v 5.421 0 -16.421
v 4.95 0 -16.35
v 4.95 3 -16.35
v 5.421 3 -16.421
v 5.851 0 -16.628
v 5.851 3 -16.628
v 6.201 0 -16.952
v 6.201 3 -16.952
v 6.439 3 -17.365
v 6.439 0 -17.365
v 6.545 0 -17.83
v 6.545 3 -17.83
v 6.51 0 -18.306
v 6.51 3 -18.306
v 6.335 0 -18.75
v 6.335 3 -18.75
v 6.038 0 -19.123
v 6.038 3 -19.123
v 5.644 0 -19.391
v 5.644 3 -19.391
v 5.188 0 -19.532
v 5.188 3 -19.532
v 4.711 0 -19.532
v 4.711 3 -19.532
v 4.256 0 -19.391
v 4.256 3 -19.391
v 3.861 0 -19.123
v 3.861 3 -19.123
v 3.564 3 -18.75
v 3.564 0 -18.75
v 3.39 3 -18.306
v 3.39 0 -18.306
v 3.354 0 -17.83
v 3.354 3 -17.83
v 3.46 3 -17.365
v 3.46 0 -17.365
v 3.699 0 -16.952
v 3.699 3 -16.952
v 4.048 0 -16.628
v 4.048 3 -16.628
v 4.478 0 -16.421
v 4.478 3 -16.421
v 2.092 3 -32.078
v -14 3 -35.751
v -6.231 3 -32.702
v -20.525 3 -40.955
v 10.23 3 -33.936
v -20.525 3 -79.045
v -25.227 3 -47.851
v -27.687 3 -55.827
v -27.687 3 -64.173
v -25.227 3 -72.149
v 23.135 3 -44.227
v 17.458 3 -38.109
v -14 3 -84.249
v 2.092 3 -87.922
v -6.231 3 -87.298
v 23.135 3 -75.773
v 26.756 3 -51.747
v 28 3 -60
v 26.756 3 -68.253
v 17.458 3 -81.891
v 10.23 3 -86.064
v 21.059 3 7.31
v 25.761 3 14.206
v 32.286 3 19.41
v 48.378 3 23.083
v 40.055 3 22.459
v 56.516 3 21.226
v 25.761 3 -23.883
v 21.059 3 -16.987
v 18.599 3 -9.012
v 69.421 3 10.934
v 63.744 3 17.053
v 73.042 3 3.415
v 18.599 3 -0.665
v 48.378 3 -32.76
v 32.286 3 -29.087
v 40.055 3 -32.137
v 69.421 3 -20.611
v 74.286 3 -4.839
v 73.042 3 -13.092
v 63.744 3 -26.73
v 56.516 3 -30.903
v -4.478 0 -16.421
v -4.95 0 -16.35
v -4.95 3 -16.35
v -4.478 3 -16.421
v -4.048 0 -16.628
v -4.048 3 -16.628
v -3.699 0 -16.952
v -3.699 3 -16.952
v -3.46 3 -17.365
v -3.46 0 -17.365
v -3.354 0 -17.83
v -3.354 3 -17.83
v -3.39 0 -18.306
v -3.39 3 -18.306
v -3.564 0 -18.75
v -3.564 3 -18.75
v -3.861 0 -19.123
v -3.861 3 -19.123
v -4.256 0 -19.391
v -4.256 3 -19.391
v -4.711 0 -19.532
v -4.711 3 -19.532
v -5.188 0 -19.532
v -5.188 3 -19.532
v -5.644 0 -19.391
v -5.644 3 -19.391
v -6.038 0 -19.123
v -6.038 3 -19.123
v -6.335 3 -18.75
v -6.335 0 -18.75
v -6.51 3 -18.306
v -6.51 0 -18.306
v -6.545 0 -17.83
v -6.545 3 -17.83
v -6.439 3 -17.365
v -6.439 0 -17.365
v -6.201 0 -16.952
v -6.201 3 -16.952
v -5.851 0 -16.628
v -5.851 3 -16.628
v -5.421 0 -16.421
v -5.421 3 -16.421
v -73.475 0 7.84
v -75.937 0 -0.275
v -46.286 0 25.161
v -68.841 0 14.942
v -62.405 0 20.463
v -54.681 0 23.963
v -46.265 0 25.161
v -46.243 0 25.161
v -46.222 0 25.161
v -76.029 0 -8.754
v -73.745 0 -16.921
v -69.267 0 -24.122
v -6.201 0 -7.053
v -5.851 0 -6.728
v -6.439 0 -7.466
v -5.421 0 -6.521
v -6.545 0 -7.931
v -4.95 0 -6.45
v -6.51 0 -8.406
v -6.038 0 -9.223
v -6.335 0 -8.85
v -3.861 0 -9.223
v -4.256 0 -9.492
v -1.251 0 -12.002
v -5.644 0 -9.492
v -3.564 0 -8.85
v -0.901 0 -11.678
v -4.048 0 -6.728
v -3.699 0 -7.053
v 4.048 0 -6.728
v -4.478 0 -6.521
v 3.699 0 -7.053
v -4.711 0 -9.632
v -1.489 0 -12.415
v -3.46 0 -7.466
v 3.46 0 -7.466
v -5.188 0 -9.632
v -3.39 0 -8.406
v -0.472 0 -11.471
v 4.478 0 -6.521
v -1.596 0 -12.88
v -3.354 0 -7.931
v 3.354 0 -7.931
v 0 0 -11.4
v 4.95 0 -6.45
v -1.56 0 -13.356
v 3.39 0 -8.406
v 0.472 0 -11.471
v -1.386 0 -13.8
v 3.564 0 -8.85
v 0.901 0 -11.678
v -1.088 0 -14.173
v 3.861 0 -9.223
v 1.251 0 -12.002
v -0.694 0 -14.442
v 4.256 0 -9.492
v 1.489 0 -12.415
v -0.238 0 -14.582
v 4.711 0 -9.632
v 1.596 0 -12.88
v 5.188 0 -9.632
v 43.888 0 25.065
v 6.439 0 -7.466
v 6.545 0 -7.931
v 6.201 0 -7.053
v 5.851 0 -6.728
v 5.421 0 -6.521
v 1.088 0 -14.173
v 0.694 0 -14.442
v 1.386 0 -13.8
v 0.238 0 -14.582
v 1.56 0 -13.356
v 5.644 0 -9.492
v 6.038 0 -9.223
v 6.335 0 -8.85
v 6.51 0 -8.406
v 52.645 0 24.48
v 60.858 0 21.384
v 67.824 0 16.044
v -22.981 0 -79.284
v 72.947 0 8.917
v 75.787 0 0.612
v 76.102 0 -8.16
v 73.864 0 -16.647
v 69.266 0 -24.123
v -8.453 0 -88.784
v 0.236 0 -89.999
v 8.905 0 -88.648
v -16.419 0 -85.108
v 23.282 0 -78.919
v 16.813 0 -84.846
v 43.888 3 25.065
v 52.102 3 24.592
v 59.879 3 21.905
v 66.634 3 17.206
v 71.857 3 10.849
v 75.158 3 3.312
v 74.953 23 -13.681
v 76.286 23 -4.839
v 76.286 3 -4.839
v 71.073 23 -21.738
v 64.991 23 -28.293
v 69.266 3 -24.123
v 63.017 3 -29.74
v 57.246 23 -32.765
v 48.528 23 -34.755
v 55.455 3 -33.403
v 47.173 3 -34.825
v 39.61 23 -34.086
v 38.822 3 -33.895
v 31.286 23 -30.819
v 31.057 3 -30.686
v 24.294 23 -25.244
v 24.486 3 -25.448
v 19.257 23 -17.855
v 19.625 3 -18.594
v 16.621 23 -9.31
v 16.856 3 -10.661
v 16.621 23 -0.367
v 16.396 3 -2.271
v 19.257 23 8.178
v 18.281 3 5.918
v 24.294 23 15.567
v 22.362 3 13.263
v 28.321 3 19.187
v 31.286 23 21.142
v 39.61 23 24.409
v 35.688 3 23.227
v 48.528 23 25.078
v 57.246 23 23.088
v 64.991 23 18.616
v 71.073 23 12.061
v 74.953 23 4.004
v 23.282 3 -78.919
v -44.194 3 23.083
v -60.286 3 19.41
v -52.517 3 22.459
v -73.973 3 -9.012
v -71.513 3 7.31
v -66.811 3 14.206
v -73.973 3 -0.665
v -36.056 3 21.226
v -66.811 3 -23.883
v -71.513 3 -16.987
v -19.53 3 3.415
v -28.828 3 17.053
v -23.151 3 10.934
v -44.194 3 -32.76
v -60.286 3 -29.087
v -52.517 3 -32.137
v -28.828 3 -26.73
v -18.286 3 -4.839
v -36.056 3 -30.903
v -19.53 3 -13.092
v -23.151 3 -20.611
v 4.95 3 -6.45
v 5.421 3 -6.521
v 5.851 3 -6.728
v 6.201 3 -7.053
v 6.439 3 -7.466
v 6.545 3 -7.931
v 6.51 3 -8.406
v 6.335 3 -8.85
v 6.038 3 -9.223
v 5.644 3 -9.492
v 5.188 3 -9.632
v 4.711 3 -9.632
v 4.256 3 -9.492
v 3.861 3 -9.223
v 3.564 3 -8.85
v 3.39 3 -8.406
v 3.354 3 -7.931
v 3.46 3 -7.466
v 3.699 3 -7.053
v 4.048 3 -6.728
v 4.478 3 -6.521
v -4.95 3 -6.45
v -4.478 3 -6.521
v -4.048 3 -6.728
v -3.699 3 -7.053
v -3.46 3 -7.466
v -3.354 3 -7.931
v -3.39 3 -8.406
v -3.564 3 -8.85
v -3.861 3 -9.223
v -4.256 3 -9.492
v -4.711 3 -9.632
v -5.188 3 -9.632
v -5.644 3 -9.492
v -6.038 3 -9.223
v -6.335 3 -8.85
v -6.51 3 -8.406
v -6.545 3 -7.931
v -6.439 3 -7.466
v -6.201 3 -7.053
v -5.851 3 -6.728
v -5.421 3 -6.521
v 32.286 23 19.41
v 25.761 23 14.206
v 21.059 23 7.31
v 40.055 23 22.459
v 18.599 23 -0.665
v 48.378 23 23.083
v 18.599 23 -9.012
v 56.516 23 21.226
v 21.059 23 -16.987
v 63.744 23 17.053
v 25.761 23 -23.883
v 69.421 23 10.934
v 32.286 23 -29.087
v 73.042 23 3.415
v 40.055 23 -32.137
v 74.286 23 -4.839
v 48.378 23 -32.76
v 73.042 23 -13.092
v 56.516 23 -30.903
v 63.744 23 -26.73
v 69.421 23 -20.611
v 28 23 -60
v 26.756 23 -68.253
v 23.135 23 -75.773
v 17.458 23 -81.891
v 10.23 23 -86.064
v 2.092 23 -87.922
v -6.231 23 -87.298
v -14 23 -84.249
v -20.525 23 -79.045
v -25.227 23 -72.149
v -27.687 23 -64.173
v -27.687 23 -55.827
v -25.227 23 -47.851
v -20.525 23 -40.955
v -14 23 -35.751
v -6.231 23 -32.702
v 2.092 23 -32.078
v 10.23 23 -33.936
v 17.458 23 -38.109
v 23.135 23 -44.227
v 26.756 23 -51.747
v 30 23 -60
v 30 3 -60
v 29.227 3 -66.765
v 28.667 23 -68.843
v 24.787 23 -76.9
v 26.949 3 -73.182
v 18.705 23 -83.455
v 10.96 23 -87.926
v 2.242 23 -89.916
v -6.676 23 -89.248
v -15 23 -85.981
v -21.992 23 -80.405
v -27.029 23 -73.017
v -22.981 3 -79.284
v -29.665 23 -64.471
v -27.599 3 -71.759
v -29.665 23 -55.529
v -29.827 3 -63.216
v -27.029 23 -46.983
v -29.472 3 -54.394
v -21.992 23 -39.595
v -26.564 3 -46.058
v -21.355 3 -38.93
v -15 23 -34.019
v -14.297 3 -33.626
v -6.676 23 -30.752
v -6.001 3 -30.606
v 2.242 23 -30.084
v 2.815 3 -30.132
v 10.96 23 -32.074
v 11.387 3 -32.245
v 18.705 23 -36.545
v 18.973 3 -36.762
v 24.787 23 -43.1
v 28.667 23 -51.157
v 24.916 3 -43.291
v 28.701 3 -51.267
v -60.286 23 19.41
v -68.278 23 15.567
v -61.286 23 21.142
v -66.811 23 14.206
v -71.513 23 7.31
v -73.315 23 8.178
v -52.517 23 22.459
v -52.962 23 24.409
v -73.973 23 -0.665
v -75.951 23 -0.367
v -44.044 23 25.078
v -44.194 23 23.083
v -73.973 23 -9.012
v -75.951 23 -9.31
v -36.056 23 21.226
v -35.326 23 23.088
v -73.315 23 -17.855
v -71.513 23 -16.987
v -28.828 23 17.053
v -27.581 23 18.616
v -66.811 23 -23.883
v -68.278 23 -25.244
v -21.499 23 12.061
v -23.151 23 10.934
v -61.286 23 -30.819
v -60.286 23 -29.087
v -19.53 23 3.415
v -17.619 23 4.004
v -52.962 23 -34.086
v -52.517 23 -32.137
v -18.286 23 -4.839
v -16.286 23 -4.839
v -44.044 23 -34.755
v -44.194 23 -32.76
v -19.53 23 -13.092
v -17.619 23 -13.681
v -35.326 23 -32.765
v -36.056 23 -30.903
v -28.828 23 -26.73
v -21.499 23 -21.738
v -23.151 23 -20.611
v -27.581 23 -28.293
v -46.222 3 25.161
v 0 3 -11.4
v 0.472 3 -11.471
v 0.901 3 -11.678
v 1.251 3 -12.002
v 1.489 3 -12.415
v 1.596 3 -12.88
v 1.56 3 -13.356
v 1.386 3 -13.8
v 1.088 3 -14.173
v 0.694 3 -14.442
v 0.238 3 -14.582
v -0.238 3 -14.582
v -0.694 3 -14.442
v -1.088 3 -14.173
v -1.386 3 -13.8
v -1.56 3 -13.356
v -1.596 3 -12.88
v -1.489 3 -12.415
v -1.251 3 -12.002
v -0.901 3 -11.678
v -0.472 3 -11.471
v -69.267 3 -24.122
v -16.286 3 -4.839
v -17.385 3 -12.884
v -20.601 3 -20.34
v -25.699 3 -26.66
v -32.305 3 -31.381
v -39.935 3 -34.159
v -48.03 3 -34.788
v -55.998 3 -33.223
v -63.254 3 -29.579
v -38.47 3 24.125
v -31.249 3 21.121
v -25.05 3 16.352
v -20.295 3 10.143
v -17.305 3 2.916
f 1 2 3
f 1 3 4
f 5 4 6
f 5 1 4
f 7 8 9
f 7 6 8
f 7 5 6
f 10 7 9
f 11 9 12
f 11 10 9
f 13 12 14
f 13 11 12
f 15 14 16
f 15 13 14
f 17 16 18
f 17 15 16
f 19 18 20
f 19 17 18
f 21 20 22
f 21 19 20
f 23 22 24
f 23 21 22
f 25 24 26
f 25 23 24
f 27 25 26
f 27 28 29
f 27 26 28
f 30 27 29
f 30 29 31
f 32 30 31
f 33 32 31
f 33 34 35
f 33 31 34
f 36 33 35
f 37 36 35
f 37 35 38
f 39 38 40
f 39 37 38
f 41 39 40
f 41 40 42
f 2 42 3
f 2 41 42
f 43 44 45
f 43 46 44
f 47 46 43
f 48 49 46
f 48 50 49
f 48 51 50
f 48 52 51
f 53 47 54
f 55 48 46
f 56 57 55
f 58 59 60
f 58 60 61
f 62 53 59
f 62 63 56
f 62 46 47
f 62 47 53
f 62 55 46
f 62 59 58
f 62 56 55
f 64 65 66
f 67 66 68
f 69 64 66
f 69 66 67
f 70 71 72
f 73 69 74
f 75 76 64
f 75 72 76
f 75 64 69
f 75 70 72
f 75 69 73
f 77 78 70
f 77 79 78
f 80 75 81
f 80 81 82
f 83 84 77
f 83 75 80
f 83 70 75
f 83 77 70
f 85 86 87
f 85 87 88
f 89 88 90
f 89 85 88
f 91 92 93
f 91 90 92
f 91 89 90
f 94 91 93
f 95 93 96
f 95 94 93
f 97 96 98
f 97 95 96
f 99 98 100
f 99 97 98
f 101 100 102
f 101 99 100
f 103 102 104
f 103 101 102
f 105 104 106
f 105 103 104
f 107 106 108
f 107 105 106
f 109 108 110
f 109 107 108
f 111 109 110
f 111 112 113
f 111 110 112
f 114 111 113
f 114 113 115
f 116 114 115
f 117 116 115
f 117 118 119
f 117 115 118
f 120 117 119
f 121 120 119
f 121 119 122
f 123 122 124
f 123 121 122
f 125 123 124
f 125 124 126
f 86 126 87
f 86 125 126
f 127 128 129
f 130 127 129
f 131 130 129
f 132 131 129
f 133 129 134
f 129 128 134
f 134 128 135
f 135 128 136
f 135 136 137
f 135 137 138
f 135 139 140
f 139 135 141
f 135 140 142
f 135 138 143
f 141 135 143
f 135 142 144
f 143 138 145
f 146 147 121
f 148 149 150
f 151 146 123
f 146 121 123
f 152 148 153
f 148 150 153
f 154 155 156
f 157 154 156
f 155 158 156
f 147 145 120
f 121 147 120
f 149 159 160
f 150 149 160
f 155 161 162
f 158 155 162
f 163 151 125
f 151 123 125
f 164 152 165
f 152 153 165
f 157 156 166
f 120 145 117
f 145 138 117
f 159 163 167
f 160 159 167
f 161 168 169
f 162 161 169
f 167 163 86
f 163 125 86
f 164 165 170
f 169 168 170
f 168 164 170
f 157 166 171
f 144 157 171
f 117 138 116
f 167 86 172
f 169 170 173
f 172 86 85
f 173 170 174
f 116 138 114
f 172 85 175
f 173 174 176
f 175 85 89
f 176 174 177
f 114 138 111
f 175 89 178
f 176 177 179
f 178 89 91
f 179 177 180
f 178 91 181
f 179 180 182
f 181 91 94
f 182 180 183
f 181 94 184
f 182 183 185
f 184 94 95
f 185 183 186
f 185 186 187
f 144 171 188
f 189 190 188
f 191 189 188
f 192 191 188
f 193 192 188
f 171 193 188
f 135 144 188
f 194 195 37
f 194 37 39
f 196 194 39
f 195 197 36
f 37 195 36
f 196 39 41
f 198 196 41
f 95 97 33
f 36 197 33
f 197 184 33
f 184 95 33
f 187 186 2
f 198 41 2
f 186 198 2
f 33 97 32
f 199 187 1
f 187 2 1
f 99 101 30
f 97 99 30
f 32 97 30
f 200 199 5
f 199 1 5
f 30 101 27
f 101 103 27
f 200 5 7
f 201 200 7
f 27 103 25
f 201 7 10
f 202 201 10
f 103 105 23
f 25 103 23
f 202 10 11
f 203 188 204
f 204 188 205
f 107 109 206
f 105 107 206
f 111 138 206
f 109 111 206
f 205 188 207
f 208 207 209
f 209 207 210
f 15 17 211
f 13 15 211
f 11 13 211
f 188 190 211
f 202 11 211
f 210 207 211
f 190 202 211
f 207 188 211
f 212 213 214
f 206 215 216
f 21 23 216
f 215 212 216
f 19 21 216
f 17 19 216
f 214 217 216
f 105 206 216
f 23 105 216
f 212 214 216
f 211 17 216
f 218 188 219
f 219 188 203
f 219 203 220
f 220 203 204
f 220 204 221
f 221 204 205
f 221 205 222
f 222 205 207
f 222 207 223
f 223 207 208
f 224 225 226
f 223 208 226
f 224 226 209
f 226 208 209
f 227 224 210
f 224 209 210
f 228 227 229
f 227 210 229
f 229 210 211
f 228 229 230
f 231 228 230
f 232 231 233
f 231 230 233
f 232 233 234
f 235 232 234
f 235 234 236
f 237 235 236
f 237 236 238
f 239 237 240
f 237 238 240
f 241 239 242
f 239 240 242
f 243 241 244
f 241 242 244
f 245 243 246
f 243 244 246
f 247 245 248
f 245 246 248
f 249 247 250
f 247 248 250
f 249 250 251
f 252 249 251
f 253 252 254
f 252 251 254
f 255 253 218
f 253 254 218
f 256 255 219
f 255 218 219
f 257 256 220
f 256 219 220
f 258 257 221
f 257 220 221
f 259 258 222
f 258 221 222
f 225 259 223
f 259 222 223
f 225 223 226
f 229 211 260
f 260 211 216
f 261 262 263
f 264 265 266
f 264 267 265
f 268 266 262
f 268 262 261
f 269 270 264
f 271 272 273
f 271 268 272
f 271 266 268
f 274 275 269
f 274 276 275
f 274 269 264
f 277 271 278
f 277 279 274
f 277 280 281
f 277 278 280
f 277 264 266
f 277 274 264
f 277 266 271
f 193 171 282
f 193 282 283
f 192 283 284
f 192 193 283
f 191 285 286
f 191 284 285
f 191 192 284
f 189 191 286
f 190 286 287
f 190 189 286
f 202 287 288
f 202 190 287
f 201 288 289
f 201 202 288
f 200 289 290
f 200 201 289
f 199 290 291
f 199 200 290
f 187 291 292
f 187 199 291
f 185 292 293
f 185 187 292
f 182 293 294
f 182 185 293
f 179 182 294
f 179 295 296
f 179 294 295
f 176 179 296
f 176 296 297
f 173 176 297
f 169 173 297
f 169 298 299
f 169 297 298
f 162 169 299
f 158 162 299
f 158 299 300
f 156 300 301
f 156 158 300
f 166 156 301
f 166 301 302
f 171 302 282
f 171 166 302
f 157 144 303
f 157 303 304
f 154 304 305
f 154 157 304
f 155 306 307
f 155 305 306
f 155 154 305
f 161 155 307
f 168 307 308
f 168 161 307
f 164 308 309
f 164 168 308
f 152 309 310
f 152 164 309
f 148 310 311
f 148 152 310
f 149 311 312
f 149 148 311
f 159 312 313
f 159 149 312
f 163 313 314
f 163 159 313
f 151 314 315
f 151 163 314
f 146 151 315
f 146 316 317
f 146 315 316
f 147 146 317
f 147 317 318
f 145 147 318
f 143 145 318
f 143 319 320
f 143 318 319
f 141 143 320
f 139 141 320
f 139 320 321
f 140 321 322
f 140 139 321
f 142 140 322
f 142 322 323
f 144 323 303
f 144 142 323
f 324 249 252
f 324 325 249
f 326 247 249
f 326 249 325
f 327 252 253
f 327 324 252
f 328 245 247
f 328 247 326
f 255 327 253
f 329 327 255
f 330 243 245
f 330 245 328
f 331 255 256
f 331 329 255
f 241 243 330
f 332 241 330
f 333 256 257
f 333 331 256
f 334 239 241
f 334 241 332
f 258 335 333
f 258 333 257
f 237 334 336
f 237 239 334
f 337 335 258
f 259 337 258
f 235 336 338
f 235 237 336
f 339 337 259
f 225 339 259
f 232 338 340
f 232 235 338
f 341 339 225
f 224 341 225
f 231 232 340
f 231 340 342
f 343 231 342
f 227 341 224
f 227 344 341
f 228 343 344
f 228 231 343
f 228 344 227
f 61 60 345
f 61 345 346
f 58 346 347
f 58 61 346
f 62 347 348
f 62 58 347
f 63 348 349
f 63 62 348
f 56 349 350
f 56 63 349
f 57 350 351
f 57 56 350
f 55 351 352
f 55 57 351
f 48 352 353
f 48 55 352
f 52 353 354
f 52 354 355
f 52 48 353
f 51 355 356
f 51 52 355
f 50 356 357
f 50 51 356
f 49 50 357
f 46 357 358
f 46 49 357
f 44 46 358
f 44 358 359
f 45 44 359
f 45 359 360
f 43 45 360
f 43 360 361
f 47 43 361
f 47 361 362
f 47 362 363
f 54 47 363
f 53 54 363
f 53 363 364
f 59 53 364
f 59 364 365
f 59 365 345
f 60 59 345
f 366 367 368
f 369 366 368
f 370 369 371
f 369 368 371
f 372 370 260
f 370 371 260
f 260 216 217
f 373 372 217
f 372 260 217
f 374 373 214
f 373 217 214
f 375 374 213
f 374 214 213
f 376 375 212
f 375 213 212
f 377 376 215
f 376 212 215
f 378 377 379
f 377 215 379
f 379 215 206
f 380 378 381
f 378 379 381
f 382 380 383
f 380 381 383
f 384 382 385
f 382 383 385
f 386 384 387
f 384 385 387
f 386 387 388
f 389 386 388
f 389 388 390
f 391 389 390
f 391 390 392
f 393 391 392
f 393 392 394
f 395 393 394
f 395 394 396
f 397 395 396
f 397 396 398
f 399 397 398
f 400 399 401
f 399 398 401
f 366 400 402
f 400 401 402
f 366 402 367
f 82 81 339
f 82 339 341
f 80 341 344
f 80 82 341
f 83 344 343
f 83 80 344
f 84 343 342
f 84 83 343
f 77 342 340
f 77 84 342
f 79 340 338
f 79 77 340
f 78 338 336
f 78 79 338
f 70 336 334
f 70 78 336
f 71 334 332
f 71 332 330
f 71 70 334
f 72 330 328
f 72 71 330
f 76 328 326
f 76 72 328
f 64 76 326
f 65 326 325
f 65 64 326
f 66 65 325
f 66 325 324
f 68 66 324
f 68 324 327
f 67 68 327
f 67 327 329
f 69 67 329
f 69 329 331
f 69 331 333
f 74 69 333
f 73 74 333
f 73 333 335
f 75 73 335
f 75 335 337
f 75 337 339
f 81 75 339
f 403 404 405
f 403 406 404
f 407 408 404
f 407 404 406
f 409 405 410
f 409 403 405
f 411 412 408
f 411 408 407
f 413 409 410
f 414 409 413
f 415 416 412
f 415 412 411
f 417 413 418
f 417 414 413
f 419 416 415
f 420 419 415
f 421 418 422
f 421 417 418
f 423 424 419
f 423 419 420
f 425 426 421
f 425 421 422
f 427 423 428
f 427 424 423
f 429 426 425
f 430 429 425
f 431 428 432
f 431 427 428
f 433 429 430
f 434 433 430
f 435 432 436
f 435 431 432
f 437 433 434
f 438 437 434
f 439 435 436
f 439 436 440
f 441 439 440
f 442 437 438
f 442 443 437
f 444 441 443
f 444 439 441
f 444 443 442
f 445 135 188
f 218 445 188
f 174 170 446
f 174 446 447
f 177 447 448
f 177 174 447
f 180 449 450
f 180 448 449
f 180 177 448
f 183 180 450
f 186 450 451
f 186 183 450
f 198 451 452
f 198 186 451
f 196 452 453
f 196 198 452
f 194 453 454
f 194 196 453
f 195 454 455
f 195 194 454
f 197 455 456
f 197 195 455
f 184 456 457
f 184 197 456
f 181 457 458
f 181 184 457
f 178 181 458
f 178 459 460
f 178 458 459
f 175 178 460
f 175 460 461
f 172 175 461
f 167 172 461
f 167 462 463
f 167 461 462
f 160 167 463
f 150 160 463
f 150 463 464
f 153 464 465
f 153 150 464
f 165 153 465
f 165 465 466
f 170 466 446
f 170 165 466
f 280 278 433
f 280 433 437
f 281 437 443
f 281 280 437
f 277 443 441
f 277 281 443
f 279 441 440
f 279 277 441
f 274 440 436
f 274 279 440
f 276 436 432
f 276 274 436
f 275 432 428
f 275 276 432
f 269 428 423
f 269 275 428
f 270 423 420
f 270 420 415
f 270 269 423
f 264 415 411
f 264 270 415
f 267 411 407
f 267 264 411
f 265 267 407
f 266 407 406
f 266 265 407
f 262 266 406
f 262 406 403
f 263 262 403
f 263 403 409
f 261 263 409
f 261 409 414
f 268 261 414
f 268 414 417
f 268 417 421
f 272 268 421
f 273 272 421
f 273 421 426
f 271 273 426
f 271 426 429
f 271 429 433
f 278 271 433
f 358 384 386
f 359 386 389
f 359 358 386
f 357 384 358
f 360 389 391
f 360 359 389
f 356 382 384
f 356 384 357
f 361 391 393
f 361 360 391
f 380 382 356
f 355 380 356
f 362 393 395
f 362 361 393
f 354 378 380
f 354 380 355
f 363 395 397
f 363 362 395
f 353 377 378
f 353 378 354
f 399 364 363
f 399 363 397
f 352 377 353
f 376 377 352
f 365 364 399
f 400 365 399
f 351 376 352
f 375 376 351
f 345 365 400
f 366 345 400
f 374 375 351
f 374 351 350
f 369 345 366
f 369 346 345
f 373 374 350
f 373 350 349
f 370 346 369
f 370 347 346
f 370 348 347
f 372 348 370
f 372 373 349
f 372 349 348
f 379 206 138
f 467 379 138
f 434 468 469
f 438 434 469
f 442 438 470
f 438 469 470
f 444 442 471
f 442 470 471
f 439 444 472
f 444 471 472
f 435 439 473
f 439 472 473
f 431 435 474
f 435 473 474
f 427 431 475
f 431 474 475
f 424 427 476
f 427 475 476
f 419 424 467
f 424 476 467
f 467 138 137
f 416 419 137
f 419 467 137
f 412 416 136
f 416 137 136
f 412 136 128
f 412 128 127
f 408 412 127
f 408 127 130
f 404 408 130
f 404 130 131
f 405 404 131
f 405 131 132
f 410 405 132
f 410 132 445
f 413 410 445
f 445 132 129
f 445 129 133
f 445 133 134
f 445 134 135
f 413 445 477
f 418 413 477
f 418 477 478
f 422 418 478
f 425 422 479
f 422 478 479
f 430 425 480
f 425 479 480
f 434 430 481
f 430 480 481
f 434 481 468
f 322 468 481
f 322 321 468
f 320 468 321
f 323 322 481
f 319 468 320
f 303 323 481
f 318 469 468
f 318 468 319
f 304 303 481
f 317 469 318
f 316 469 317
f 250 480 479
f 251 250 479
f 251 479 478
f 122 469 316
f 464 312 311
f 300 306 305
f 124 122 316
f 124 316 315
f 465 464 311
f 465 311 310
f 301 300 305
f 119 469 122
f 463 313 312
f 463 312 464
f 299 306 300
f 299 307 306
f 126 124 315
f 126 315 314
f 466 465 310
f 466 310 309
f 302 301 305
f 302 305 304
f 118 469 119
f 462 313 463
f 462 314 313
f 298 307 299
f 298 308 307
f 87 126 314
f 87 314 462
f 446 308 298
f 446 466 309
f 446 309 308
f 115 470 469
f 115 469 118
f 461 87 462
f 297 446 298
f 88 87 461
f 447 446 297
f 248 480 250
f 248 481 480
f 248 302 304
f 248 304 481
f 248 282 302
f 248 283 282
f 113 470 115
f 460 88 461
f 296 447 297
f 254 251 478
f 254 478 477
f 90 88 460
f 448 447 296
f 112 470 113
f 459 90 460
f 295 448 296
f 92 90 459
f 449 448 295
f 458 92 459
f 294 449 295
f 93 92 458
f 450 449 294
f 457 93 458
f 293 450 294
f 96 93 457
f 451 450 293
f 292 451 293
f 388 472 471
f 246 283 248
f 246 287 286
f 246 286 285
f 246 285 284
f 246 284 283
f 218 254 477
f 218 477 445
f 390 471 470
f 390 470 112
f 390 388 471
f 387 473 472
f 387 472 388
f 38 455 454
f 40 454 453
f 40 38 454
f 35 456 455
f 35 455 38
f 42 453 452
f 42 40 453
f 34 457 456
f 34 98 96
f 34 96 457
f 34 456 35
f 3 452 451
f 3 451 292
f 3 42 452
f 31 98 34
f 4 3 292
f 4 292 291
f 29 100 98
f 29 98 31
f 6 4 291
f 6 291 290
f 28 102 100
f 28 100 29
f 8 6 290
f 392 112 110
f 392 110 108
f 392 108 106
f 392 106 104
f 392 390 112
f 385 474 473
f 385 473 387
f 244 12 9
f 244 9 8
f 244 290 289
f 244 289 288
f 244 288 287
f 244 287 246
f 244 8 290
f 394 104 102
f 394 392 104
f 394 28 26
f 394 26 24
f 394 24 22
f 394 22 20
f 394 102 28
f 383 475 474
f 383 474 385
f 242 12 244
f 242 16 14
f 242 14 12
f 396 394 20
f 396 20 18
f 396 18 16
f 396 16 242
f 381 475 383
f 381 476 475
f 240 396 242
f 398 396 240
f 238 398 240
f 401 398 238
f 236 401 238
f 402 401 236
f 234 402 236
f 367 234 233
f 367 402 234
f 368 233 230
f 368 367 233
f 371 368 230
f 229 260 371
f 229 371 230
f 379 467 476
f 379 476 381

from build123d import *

# Parameters (mm, degrees)
EXTRUDE_1_DEPTH          = 3
EXTRUDE_START            = -3.0000001
EXTRUDE_2_OUTLINE_R      = 30
EXTRUDE_2_OUTLINE_R_2    = 28
EXTRUDE_2_DEPTH          = 23.0000001
CUT_EXTRUDE_1_DEPTH      = 120.66431532924713
CUT_EXTRUDE_1_DEPTH_BACK = 120.66431532924713
SKETCH_6_R               = 1.6000000000000003
SKETCH_6_R_2             = 1.5999999999999923
SKETCH_6_R_3             = 1.5999999999999999
SKETCH_6_R_4             = 1.5999999999999257
SKETCH_6_R_5             = 1.6


with BuildPart() as part:
    # 草图1 → 凸台-拉伸1 (new body)
    with BuildSketch(Plane(origin=(0, 0, 0), x_dir=(1, 0, 0), z_dir=(0, 1, 0))):
        with BuildLine():
            Line((69.26629435231834, 24.123359602578955), (22.672692502757357, 79.64558511919181))
            ThreePointArc((22.672692502757354, 79.64558511919181), (-0.2378402213252036, 89.99905718567035), (-22.981333293569364, 79.28362829059616))
            Line((-22.981333293569378, 79.28362829059616), (-69.26729768514315, 24.12216394025026))
            ThreePointArc((-69.26729768514312, 24.122163940250257), (-73.47519800267324, -7.84001220256689), (-46.285964391573756, -25.161464350345888))
            Line((-46.28596439157374, -25.161464350345884), (43.8875404004589, -25.065436701169876))
            ThreePointArc((43.887540400458896, -25.065436701169865), (72.946574545668, -8.916894776595973), (69.26629435231834, 24.12335960257895))
        make_face()
    extrude(amount=EXTRUDE_1_DEPTH)

    # 凸台-拉伸2: read off the stored shape, not the designer's step
    # 凸台-拉伸2 outline → 凸台-拉伸2 (add)
    # profile 1 of 3: a face of its own
    with BuildSketch(Plane(origin=(0, 3, 0), x_dir=(1, 0, 0), z_dir=(0, 1, 0)).offset(EXTRUDE_START)):
        with Locations((-46.285964392, 4.83853565)):
            Circle(EXTRUDE_2_OUTLINE_R)
        with Locations((-46.285964392, 4.83853565)):
            Circle(EXTRUDE_2_OUTLINE_R_2, mode=Mode.SUBTRACT)
    # profile 2 of 3: a face of its own
    with BuildSketch(Plane(origin=(0, 3, 0), x_dir=(1, 0, 0), z_dir=(0, 1, 0)).offset(EXTRUDE_START)):
        with Locations((46.285964392, 4.83853565)):
            Circle(EXTRUDE_2_OUTLINE_R)
        with Locations((46.285964392, 4.83853565)):
            Circle(EXTRUDE_2_OUTLINE_R_2, mode=Mode.SUBTRACT)
    # profile 3 of 3: a face of its own
    with BuildSketch(Plane(origin=(0, 3, 0), x_dir=(1, 0, 0), z_dir=(0, 1, 0)).offset(EXTRUDE_START)):
        with Locations((0, 60)):
            Circle(EXTRUDE_2_OUTLINE_R)
        with Locations((0, 60)):
            Circle(EXTRUDE_2_OUTLINE_R_2, mode=Mode.SUBTRACT)
    extrude(amount=EXTRUDE_2_DEPTH)

    # 草图6 → 切除-拉伸1 (cut, two sides: drawn at the far end of the back side and taken through both)
    with BuildSketch(Plane(origin=(0, 3, 0), x_dir=(1, 0, 0), z_dir=(0, 1, 0)).offset(-CUT_EXTRUDE_1_DEPTH_BACK)):
        with Locations(Location((0, 13, 0), (0, 0, 270))):
            Circle(SKETCH_6_R)
        with Locations(Location((4.9497474683058345, 17.949747468305834, 0), (0, 0, 270))):
            Circle(SKETCH_6_R_2)
        with Locations(Location((4.949747468305964, 8.050252531694156, 0), (0, 0, 270))):
            Circle(SKETCH_6_R_3)
        with Locations(Location((-4.949747468305834, 8.050252531694166, 0), (0, 0, 270))):
            Circle(SKETCH_6_R_4)
        with Locations(Location((-4.949747468305791, 17.949747468305738, 0), (0, 0, 270))):
            Circle(SKETCH_6_R_5)
    extrude(amount=CUT_EXTRUDE_1_DEPTH + CUT_EXTRUDE_1_DEPTH_BACK, mode=Mode.SUBTRACT)


solid = part.part
